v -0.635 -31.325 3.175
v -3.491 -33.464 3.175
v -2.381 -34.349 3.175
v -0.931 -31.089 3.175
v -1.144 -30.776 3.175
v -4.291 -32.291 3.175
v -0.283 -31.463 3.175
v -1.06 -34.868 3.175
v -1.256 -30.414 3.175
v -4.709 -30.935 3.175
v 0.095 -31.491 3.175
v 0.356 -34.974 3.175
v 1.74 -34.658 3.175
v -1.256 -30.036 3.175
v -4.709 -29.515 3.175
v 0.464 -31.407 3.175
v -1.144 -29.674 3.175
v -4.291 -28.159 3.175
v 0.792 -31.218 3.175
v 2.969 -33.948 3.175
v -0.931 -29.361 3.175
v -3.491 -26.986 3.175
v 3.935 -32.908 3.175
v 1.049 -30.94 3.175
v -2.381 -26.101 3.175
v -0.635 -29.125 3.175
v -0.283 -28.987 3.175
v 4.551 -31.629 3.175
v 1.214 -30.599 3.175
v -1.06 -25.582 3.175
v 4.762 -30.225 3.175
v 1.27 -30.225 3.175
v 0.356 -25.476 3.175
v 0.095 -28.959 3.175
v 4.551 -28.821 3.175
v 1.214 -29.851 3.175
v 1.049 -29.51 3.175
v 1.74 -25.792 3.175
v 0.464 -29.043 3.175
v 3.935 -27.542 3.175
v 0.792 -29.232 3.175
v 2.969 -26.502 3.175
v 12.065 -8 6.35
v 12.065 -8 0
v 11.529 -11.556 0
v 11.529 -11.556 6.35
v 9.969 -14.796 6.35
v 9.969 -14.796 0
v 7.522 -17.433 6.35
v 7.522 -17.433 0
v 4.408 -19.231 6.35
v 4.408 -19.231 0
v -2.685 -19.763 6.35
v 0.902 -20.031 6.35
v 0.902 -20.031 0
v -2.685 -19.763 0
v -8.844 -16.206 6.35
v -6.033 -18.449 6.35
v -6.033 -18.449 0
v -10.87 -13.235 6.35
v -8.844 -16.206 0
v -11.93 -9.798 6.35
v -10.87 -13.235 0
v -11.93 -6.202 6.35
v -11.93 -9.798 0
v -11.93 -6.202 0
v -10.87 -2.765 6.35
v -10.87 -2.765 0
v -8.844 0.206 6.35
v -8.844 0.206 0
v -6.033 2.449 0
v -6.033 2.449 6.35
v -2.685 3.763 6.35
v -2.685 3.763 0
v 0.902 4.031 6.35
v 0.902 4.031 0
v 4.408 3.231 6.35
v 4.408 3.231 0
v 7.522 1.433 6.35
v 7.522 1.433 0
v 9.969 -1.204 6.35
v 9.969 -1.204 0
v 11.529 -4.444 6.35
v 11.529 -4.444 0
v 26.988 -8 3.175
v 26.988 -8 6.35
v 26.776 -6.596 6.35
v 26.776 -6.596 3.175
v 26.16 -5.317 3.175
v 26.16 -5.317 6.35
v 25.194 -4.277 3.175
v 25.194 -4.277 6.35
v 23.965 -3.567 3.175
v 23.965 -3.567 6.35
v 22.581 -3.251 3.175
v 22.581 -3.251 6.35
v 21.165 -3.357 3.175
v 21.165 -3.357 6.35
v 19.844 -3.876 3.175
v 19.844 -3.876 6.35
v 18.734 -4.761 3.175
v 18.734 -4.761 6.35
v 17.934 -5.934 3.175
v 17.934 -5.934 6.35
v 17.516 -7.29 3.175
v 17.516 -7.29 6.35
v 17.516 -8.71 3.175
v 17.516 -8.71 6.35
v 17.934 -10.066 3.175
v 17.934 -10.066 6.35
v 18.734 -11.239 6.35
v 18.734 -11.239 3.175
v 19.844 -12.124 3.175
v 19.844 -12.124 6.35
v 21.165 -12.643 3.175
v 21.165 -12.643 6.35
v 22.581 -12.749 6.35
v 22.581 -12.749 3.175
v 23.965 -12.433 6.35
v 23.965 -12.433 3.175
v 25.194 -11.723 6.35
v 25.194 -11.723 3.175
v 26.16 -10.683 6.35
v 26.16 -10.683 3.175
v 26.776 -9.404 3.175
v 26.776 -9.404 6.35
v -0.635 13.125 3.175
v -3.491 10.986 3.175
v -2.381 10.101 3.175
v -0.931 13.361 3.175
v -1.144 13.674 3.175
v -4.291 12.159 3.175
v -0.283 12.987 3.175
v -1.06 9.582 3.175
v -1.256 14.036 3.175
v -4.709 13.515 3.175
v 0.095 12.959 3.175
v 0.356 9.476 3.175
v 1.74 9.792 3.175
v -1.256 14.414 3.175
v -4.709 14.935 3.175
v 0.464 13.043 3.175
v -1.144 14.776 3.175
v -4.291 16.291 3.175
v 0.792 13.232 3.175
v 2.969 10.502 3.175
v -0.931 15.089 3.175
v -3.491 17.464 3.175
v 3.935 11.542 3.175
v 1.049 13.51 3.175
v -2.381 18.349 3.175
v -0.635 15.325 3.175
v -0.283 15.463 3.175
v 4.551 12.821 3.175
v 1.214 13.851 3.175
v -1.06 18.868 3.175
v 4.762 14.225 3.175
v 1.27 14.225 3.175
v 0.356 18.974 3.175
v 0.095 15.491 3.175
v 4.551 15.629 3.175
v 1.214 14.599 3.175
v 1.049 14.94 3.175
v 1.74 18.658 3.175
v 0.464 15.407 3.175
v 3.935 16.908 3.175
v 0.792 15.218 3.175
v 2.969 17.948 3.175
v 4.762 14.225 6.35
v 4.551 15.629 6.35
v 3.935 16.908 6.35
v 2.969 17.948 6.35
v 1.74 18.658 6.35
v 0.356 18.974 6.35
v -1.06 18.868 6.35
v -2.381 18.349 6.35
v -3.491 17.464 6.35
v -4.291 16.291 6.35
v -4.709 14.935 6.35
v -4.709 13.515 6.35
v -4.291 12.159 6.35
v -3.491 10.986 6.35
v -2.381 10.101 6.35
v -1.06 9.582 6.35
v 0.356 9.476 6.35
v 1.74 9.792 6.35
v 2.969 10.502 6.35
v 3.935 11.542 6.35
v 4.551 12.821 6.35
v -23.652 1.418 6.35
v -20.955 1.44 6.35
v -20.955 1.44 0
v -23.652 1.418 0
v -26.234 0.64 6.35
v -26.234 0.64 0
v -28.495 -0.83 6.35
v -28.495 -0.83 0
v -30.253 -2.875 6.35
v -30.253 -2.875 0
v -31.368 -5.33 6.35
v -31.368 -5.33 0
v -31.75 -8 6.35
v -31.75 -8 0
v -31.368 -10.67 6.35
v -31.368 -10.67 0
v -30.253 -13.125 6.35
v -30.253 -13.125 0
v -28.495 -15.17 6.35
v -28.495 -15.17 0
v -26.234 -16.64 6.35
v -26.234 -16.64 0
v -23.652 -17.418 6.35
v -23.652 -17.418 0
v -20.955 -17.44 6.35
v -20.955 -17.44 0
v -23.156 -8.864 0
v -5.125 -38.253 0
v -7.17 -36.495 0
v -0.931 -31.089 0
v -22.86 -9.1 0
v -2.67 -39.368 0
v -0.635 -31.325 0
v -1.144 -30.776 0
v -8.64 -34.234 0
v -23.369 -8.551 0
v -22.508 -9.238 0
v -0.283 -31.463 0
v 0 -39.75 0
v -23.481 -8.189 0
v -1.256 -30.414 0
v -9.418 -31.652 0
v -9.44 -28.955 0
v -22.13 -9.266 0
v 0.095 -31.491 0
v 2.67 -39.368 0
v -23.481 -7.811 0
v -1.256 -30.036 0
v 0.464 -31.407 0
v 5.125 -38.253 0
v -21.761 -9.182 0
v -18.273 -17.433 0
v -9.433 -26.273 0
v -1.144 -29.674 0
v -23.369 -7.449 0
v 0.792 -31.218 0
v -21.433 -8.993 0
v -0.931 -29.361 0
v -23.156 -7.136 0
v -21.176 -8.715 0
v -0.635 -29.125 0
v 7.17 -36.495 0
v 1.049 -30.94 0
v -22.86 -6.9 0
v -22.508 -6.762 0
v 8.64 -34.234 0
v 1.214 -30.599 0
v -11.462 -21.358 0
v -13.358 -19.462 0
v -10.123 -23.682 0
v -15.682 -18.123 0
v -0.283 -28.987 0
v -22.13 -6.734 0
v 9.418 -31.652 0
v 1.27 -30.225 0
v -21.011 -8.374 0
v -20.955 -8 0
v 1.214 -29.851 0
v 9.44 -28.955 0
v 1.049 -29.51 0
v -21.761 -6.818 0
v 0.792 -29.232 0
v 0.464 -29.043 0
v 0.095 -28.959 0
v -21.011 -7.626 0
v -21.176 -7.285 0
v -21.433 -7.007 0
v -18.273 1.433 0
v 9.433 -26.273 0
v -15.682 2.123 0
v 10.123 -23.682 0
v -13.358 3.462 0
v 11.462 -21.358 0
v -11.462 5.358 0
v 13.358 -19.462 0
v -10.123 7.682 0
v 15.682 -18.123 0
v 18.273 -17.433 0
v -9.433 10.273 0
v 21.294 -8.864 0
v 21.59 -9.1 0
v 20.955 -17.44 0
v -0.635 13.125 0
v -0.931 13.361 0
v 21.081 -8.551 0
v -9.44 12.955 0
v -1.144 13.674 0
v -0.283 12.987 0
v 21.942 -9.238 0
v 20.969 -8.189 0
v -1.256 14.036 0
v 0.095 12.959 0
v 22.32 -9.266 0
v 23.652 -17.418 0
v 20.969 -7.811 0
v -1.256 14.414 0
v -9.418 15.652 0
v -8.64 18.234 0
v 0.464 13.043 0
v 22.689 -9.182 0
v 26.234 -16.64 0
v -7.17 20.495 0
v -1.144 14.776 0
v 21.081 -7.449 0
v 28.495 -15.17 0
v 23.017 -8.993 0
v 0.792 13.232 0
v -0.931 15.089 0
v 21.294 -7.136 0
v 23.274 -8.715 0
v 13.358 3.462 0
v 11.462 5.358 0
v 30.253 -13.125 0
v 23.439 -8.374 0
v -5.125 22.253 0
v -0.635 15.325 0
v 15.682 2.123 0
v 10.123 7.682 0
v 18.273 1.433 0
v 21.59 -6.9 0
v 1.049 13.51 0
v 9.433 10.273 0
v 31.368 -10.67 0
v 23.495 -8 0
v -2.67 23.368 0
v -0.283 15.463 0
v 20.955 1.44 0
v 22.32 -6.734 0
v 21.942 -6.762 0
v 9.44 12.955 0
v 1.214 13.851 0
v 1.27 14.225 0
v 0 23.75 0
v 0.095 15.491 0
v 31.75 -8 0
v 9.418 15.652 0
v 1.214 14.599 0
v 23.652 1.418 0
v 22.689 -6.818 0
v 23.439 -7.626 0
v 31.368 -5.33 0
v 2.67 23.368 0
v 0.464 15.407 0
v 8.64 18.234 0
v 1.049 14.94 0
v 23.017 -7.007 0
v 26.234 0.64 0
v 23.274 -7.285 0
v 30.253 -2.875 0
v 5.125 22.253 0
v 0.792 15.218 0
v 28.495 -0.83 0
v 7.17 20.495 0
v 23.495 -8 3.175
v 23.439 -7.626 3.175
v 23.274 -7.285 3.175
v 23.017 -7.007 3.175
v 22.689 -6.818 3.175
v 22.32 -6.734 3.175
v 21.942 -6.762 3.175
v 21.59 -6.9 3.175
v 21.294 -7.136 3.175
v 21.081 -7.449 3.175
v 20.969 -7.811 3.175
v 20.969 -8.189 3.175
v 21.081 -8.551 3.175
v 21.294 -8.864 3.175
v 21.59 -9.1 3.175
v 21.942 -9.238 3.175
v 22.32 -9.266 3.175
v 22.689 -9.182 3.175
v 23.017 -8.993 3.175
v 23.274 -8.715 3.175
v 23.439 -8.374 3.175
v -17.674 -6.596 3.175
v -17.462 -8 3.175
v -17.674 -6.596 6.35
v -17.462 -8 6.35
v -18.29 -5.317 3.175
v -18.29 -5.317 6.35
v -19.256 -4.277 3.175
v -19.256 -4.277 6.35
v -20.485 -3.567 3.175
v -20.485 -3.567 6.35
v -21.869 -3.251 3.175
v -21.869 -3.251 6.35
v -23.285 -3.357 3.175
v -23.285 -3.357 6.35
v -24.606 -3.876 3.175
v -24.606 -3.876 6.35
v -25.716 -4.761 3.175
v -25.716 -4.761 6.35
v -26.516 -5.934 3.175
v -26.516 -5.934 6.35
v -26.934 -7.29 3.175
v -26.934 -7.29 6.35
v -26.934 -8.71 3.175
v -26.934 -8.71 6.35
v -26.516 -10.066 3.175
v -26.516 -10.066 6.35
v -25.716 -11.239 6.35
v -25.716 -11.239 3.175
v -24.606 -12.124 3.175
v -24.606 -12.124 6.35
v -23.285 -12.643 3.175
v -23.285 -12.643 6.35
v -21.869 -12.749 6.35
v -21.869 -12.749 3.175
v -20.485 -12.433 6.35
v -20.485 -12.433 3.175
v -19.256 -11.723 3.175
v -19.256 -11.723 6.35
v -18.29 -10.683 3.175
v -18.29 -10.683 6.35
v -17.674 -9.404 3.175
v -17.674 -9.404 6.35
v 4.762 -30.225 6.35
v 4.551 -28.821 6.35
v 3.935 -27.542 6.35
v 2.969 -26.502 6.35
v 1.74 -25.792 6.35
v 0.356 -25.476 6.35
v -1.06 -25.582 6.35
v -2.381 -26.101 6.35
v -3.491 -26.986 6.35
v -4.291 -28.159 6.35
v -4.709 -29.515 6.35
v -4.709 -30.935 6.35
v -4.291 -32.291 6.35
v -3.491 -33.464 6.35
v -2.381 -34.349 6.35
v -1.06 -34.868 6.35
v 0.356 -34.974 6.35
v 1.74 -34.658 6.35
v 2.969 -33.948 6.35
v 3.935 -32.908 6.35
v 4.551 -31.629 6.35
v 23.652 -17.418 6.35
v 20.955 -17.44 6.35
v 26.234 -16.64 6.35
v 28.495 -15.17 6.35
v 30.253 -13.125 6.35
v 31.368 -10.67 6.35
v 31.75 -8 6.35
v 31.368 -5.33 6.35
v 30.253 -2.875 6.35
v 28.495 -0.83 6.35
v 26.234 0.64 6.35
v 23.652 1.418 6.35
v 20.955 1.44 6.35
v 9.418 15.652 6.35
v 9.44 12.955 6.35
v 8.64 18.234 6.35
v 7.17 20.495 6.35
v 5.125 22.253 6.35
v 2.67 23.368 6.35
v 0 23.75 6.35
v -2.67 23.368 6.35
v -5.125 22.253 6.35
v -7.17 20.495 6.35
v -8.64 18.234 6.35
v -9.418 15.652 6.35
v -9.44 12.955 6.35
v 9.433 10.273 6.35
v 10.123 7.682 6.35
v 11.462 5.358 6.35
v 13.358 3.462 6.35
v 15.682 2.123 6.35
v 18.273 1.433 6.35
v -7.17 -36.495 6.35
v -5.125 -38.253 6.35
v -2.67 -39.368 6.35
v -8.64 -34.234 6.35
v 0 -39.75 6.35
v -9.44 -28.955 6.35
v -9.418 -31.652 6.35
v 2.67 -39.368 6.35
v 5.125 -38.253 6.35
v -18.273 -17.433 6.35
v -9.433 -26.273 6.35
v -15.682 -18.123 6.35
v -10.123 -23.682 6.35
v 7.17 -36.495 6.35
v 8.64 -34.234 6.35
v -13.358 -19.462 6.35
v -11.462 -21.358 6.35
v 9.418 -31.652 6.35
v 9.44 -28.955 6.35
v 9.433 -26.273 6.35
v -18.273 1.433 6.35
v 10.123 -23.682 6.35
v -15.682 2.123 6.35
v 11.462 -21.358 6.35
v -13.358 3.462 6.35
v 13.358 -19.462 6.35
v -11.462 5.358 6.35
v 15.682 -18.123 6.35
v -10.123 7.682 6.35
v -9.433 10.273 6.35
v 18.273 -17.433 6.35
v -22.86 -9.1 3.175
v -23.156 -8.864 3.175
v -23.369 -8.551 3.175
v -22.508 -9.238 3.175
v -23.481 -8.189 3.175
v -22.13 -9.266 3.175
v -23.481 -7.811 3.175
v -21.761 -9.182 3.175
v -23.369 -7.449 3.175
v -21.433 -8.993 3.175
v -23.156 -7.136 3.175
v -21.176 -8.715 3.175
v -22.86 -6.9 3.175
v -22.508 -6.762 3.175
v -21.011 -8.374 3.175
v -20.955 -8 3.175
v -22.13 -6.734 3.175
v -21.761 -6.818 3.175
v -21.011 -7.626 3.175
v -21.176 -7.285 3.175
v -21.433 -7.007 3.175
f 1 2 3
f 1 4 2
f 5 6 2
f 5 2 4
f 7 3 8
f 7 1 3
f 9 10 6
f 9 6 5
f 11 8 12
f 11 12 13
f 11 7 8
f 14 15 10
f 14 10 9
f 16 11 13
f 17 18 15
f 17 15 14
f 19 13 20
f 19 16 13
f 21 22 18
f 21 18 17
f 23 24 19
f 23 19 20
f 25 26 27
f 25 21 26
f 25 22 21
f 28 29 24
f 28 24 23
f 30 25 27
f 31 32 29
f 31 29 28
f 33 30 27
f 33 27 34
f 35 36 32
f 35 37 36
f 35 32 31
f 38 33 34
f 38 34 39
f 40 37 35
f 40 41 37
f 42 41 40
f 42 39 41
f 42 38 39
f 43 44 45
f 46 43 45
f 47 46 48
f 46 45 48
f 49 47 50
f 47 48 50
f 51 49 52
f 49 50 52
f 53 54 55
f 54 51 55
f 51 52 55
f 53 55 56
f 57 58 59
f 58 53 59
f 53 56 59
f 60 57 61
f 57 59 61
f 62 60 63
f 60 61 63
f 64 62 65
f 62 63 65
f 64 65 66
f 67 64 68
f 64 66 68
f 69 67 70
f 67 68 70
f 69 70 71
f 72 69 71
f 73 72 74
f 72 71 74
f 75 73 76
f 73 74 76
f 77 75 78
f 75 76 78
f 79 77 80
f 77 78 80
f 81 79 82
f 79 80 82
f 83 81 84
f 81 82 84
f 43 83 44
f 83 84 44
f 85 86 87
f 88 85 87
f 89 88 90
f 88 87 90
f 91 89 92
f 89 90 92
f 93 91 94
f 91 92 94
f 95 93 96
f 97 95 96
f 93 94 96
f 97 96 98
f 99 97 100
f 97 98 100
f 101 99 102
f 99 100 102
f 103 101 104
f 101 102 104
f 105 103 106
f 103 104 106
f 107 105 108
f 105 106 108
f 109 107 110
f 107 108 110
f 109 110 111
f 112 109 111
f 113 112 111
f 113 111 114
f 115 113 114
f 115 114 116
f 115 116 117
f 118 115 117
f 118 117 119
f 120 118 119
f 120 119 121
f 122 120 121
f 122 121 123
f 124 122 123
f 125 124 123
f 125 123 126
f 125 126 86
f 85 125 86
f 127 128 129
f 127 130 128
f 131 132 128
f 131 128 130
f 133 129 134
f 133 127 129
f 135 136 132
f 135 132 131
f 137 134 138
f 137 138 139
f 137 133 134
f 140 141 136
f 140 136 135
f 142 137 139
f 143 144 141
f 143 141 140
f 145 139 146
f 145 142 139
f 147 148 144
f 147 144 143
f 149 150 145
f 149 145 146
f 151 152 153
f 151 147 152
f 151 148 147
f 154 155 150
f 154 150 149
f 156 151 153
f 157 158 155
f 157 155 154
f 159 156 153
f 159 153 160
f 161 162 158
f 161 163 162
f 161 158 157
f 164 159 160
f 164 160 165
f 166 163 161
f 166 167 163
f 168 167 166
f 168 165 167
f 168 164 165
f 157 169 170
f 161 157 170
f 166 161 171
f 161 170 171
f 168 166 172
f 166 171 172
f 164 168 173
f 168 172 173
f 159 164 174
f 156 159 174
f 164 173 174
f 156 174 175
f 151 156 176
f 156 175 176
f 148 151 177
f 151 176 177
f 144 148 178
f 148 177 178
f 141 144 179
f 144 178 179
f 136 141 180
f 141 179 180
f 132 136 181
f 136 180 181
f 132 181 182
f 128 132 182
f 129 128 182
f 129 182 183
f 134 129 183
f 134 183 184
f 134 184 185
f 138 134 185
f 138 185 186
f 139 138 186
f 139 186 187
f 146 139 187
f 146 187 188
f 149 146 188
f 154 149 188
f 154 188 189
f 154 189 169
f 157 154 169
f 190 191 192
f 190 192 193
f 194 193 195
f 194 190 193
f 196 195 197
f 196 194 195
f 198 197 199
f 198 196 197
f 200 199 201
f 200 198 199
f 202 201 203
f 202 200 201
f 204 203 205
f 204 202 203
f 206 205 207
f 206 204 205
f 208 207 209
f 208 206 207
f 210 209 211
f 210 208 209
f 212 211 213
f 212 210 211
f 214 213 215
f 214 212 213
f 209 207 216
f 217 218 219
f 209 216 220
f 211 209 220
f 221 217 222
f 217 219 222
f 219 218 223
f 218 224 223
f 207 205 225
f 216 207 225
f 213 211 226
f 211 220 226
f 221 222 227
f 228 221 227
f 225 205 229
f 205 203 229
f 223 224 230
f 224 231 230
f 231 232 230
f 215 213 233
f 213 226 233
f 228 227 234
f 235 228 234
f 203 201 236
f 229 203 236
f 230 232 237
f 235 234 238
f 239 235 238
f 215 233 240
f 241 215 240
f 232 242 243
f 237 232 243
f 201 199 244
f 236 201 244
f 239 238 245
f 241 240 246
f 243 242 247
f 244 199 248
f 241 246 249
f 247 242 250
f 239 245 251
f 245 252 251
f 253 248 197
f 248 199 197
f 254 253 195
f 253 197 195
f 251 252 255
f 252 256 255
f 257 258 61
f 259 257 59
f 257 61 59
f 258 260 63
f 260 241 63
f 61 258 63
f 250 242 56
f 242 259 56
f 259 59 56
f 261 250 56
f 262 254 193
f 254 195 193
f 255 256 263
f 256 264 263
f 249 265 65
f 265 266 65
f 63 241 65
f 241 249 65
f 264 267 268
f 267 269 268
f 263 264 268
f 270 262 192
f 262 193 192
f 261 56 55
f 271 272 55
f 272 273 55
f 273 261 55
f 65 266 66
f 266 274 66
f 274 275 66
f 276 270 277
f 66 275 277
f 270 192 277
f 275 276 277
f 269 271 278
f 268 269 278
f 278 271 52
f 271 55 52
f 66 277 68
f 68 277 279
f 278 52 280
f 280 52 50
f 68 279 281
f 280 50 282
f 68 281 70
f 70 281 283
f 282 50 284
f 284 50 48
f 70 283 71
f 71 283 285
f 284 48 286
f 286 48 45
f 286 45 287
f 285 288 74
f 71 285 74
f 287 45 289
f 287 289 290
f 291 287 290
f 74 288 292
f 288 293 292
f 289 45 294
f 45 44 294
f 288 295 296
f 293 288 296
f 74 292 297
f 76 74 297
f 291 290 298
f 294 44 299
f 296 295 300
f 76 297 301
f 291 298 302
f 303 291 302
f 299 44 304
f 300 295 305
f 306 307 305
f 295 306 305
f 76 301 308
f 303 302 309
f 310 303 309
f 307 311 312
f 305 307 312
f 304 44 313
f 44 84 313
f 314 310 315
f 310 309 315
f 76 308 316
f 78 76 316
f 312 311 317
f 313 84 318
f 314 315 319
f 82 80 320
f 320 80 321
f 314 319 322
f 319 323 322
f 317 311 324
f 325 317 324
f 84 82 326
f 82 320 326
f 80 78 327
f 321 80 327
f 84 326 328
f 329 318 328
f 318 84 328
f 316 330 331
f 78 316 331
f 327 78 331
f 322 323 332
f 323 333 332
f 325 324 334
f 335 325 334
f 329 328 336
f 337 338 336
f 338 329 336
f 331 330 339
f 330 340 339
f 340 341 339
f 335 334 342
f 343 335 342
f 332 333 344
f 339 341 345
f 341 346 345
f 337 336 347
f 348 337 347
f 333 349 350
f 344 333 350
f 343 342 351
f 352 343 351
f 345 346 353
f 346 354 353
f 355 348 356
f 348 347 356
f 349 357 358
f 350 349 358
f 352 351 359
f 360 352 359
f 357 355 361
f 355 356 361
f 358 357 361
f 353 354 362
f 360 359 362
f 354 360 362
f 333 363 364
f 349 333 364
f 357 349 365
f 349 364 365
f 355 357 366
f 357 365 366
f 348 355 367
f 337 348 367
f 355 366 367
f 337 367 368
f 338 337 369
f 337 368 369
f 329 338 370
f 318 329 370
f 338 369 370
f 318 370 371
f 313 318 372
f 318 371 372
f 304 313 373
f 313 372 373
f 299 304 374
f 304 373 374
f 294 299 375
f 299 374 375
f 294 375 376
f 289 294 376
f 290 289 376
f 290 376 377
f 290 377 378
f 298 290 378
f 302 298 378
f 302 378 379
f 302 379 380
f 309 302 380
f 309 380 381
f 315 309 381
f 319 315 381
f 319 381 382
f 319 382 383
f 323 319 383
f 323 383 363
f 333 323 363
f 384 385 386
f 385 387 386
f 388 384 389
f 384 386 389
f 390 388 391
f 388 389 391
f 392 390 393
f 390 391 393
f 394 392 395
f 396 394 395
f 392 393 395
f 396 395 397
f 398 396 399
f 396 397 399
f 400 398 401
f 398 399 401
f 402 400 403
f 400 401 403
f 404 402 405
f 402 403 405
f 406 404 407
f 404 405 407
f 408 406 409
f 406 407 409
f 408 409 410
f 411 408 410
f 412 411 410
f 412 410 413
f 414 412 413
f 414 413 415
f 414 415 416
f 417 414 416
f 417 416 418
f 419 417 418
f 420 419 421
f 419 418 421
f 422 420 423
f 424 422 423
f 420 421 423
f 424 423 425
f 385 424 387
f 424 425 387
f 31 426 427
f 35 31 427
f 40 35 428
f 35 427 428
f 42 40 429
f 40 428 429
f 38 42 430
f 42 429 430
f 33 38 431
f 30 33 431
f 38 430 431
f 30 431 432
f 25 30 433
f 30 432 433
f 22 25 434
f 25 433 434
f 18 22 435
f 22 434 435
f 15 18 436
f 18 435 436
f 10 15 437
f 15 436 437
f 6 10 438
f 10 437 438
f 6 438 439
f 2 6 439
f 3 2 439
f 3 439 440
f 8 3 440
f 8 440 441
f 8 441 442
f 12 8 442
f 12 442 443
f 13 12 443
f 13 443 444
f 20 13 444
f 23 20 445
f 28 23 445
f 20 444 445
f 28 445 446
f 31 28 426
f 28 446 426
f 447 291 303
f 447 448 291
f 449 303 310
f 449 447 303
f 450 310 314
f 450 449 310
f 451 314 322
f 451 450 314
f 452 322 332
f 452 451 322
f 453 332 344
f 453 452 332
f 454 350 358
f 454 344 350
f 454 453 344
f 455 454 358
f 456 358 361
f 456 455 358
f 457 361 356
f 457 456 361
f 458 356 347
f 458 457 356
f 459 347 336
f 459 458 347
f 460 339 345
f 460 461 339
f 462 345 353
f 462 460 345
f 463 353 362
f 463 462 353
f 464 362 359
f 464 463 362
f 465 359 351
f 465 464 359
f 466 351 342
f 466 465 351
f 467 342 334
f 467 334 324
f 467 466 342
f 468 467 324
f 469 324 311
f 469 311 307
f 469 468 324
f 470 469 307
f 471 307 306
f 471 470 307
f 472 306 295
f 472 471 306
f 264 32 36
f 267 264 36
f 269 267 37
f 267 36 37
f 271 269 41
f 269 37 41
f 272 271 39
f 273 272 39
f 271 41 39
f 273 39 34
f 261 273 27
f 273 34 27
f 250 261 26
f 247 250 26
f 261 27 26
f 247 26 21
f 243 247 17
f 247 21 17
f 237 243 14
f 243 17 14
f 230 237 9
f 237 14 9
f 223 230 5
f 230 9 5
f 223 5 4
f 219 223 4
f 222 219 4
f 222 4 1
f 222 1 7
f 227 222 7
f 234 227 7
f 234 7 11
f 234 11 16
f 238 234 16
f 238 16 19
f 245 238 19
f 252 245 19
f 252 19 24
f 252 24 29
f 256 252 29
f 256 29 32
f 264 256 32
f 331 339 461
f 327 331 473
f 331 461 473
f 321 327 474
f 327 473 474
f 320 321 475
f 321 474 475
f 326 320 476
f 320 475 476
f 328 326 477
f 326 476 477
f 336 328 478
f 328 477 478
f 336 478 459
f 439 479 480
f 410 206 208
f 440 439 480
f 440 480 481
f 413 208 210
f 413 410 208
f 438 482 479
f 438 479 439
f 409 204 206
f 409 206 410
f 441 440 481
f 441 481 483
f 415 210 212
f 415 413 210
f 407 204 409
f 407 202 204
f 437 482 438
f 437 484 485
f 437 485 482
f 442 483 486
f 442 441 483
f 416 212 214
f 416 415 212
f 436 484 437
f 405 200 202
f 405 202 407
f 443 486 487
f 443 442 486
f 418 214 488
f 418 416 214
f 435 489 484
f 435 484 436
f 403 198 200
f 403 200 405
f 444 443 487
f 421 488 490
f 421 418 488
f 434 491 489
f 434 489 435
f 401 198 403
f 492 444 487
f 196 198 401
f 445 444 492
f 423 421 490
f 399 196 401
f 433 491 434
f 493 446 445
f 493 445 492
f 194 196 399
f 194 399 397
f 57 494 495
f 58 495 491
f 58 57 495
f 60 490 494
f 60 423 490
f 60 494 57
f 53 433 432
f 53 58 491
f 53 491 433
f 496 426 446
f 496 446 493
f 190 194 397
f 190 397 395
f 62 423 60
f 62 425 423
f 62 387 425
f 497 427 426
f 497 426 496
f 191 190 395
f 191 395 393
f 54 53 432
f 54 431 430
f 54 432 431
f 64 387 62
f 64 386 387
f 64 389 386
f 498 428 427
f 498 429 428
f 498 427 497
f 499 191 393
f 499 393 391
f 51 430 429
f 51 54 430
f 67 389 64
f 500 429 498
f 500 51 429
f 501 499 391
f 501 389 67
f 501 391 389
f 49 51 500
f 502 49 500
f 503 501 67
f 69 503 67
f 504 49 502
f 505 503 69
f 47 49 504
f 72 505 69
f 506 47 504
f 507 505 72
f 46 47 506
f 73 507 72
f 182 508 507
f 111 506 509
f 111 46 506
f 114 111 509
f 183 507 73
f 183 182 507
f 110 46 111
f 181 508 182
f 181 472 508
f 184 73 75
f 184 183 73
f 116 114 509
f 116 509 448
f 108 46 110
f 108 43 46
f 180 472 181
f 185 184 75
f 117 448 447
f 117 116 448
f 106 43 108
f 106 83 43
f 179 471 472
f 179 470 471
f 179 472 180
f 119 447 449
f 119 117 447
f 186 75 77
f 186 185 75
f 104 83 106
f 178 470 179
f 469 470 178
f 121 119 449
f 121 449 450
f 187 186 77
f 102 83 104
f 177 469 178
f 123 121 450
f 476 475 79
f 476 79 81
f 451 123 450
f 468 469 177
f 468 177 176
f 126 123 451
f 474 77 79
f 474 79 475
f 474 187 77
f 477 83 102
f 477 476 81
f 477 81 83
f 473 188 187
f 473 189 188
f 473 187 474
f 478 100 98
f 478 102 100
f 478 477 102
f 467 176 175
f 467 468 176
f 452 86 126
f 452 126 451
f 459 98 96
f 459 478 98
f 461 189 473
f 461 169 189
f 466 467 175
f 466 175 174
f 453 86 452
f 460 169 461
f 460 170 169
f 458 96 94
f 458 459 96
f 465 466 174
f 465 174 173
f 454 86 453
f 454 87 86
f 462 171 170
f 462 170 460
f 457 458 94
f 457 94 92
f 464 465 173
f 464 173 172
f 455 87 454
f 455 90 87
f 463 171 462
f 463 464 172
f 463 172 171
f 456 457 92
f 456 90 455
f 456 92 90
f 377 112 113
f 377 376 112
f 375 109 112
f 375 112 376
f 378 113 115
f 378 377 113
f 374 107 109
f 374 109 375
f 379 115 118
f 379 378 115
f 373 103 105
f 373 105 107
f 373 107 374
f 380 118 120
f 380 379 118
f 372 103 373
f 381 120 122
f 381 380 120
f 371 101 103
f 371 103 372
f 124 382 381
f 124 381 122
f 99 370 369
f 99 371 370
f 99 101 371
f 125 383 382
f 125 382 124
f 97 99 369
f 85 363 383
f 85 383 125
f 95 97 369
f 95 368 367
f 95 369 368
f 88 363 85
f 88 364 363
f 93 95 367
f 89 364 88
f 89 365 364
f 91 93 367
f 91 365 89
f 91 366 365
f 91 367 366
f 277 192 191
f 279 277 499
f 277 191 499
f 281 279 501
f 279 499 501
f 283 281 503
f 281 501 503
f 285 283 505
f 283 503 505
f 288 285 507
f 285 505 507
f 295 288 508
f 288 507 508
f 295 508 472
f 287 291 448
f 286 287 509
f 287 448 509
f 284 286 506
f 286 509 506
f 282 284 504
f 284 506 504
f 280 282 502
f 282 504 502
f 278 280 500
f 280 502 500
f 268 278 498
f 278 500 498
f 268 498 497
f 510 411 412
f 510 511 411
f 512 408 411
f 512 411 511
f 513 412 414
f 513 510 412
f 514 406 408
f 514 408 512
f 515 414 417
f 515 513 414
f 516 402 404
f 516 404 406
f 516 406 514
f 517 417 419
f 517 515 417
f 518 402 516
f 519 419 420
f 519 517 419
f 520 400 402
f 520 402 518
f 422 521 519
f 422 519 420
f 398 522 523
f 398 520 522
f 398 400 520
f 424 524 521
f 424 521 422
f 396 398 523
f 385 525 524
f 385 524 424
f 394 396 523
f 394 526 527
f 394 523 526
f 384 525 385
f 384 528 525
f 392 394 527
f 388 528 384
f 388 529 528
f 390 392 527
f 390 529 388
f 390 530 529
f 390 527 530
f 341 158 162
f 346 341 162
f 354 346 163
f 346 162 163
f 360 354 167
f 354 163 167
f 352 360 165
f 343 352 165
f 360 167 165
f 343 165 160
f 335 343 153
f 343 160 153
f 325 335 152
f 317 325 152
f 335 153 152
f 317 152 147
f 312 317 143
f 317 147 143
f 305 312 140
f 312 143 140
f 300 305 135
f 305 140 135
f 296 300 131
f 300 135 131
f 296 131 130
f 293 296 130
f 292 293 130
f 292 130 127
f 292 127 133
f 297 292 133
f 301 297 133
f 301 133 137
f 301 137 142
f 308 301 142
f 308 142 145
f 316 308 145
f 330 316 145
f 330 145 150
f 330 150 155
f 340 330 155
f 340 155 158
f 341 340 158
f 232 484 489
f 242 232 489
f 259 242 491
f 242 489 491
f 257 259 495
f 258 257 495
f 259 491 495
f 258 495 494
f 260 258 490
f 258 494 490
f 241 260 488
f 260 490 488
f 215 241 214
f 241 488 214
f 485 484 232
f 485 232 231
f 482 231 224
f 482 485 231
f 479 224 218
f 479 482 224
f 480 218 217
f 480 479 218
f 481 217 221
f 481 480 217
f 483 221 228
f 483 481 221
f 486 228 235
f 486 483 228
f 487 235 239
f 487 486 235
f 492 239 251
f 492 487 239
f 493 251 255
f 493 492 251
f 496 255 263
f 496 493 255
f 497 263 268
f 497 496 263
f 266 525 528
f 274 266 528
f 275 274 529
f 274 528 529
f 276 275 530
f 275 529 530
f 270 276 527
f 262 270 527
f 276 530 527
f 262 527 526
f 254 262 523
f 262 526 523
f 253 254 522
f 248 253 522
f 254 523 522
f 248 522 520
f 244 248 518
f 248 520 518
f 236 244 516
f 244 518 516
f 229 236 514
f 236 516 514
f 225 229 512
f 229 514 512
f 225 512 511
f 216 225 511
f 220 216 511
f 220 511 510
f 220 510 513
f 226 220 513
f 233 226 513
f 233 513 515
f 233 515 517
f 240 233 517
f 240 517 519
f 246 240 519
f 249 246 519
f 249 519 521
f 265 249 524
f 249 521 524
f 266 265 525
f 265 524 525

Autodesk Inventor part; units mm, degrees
ref_plane "YZ Plane" through (0, 0, 0) normal (1, 0, 0) x (0, 1, 0)
ref_plane "XZ Plane" through (0, 0, 0) normal (0, 1, 0) x (-1, 0, 0)
sketch "Sketch1" plane through (0, 0, 0) normal (0, 0, 1) x (1, 0, 0)
  circle A0 centre (0, -8) radius 12.065 projected
  arc A1 (-7.912, -62.1223) -> (-4.7827, -62.4881) centre (0, -8) ccw projected
  arc A2 (-3.3911, -60.1215) -> (-4.7827, -62.4881) centre (5.3956, -66.8807) ccw projected
  arc A3 (3.3911, -60.1215) -> (-3.3911, -60.1215) centre (0, -62.6976) ccw projected
  arc A4 (4.7827, -62.4881) -> (3.3911, -60.1215) centre (-5.3956, -66.8807) ccw projected
  arc A5 (4.7827, -62.4881) -> (7.912, -62.1223) centre (0, -8) ccw projected
  arc A6 (8.7203, -59.4986) -> (7.912, -62.1223) centre (18.829, -64.0493) ccw projected
  arc A7 (15.3198, -57.9345) -> (8.7203, -59.4986) centre (12.6141, -61.2232) ccw projected
  arc A8 (17.2196, -59.9164) -> (15.3198, -57.9345) centre (8.3287, -66.5379) ccw projected
  arc A9 (17.2196, -59.9164) -> (20.1802, -58.8388) centre (0, -8) ccw projected
  arc A10 (20.3617, -56.0994) -> (20.1802, -58.8388) centre (31.2473, -58.1962) ccw projected
  arc A11 (26.4225, -53.0555) -> (20.3617, -56.0994) centre (24.5482, -56.8795) ccw projected
  arc A12 (28.7282, -54.5458) -> (26.4225, -53.0555) centre (21.6039, -63.0393) ccw projected
  arc A13 (28.7282, -54.5458) -> (31.3605, -52.8146) centre (0, -8) ccw projected
  arc A14 (30.9053, -50.1072) -> (31.3605, -52.8146) centre (41.9811, -49.637) ccw projected
  arc A15 (36.1008, -45.7476) -> (30.9053, -50.1072) centre (35.1589, -49.9008) ccw projected
  arc A16 (38.688, -46.666) -> (36.1008, -45.7476) centre (33.7145, -56.5735) ccw projected
  arc A17 (38.688, -46.666) -> (40.8501, -44.3744) centre (0, -8) ccw projected
  arc A18 (39.7828, -41.8449) -> (40.8501, -44.3744) centre (50.4517, -38.8332) ccw projected
  arc A19 (43.8329, -36.4047) -> (39.7828, -41.8449) centre (43.8742, -40.6631) ccw projected
  arc A20 (46.5622, -36.7017) -> (43.8329, -36.4047) centre (44.0076, -47.4891) ccw projected
  arc A21 (46.5622, -36.7017) -> (48.1375, -33.9732) centre (0, -8) ccw projected
  arc A22 (46.5156, -31.7581) -> (48.1375, -33.9732) centre (56.2023, -26.3671) ccw projected
  arc A23 (49.2019, -25.5305) -> (46.5156, -31.7581) centre (50.2242, -29.6646) ccw projected
  arc A24 (51.9262, -25.19) -> (49.2019, -25.5305) centre (51.9282, -36.2758) ccw projected
  arc A25 (51.9262, -25.19) -> (52.8298, -22.1718) centre (0, -8) ccw projected
  arc A26 (50.7408, -20.3904) -> (52.8298, -22.1718) centre (58.9232, -12.9109) ccw projected
  arc A27 (51.9185, -13.7112) -> (50.7408, -20.3904) centre (53.8666, -17.4981) ccw projected
  arc A28 (54.4908, -12.7517) -> (51.9185, -13.7112) centre (57.0493, -23.5382) ccw projected
  arc A29 (54.4908, -12.7517) -> (54.674, -9.6064) centre (0, -8) ccw projected
  arc A30 (52.2305, -8.3548) -> (54.674, -9.6064) centre (58.4674, 0.8101) ccw projected
  arc A31 (51.8361, -1.584) -> (52.2305, -8.3548) centre (54.605, -4.8196) ccw projected
  arc A32 (54.1178, -0.0572) -> (51.8361, -1.584) centre (59.0949, -9.9629) ccw projected
  arc A33 (54.1178, -0.0572) -> (53.5707, 3.0455) centre (0, -8) ccw projected
  arc A34 (50.9044, 3.6999) -> (53.5707, 3.0455) centre (54.8597, 14.0561) ccw projected
  arc A35 (48.9593, 10.1973) -> (50.9044, 3.6999) centre (52.3997, 7.6874) ccw projected
  arc A36 (50.8273, 12.2092) -> (48.9593, 10.1973) centre (57.9546, 3.7182) ccw projected
  arc A37 (50.8273, 12.2092) -> (49.5794, 15.1021) centre (0, -8) ccw projected
  arc A38 (46.8341, 15.1239) -> (49.5794, 15.1021) centre (48.2944, 26.1131) ccw projected
  arc A39 (43.443, 20.9975) -> (46.8341, 15.1239) centre (47.3695, 19.3488) ccw projected
  arc A40 (44.7967, 23.386) -> (43.443, 20.9975) centre (53.69, 16.7676) ccw projected
  arc A41 (44.7967, 23.386) -> (42.9153, 25.9131) centre (0, -8) ccw projected
  arc A42 (40.2389, 25.3013) -> (42.9153, 25.9131) centre (39.1256, 36.331) ccw projected
  arc A43 (35.5847, 30.2346) -> (40.2389, 25.3013) centre (39.7856, 29.5357) ccw projected
  arc A44 (36.3511, 32.8708) -> (35.5847, 30.2346) centre (46.531, 28.4818) ccw projected
  arc A45 (36.3511, 32.8708) -> (33.9376, 34.896) centre (0, -8) ccw projected
  arc A46 (31.4745, 33.6834) -> (33.9376, 34.896) centre (27.8475, 44.1591) ccw projected
  arc A47 (25.808, 37.4103) -> (31.4745, 33.6834) centre (30.0568, 37.6992) ccw projected
  arc A48 (25.9458, 40.1523) -> (25.808, 37.4103) centre (36.8635, 38.2292) ccw projected
  arc A49 (25.9458, 40.1523) -> (23.1303, 41.5662) centre (0, -8) ccw projected
  arc A50 (21.0132, 39.8183) -> (23.1303, 41.5662) centre (15.0682, 49.1752) ccw projected
  arc A51 (14.64, 42.138) -> (21.0132, 39.8183) centre (18.7077, 43.3989) ccw projected
  arc A52 (14.1417, 44.8378) -> (14.64, 42.138) centre (25.2086, 45.4844) ccw projected
  arc A53 (14.1417, 44.8378) -> (11.0761, 45.5644) centre (0, -8) ccw projected
  arc A54 (9.4191, 43.3754) -> (11.0761, 45.5644) centre (1.4765, 51.109) ccw projected
  arc A55 (2.6827, 44.1627) -> (9.4191, 43.3754) centre (6.35, 46.3277) ccw projected
  arc A56 (1.5753, 46.6749) -> (2.6827, 44.1627) centre (12.1948, 49.8562) ccw projected
  arc A57 (1.5753, 46.6749) -> (-1.5753, 46.6749) centre (0, -8) ccw projected
  arc A58 (-2.6827, 44.1627) -> (-1.5753, 46.6749) centre (-12.1948, 49.8562) ccw projected
  arc A59 (-9.4191, 43.3754) -> (-2.6827, 44.1627) centre (-6.35, 46.3277) ccw projected
  arc A60 (-11.0761, 45.5644) -> (-9.4191, 43.3754) centre (-1.4765, 51.109) ccw projected
  arc A61 (-11.0761, 45.5644) -> (-14.1417, 44.8378) centre (0, -8) ccw projected
  arc A62 (-14.64, 42.138) -> (-14.1417, 44.8378) centre (-25.2086, 45.4844) ccw projected
  arc A63 (-21.0132, 39.8183) -> (-14.64, 42.138) centre (-18.7077, 43.3989) ccw projected
  arc A64 (-23.1303, 41.5662) -> (-21.0132, 39.8183) centre (-15.0682, 49.1752) ccw projected
  arc A65 (-23.1303, 41.5662) -> (-25.9458, 40.1523) centre (0, -8) ccw projected
  arc A66 (-25.808, 37.4103) -> (-25.9458, 40.1523) centre (-36.8635, 38.2292) ccw projected
  arc A67 (-31.4745, 33.6834) -> (-25.808, 37.4103) centre (-30.0568, 37.6992) ccw projected
  arc A68 (-33.9376, 34.896) -> (-31.4745, 33.6834) centre (-27.8475, 44.1591) ccw projected
  arc A69 (-33.9376, 34.896) -> (-36.3511, 32.8708) centre (0, -8) ccw projected
  arc A70 (-35.5847, 30.2346) -> (-36.3511, 32.8708) centre (-46.531, 28.4818) ccw projected
  arc A71 (-40.2389, 25.3013) -> (-35.5847, 30.2346) centre (-39.7856, 29.5357) ccw projected
  arc A72 (-42.9153, 25.9131) -> (-40.2389, 25.3013) centre (-39.1256, 36.331) ccw projected
  arc A73 (-42.9153, 25.9131) -> (-44.7967, 23.386) centre (0, -8) ccw projected
  arc A74 (-43.443, 20.9975) -> (-44.7967, 23.386) centre (-53.69, 16.7676) ccw projected
  arc A75 (-46.8341, 15.1239) -> (-43.443, 20.9975) centre (-47.3695, 19.3488) ccw projected
  arc A76 (-49.5794, 15.1021) -> (-46.8341, 15.1239) centre (-48.2944, 26.1131) ccw projected
  arc A77 (-49.5794, 15.1021) -> (-50.8273, 12.2092) centre (0, -8) ccw projected
  arc A78 (-48.9593, 10.1973) -> (-50.8273, 12.2092) centre (-57.9546, 3.7182) ccw projected
  arc A79 (-50.9044, 3.6999) -> (-48.9593, 10.1973) centre (-52.3997, 7.6874) ccw projected
  arc A80 (-53.5707, 3.0455) -> (-50.9044, 3.6999) centre (-54.8597, 14.0561) ccw projected
  arc A81 (-53.5707, 3.0455) -> (-54.1178, -0.0572) centre (0, -8) ccw projected
  arc A82 (-51.8361, -1.584) -> (-54.1178, -0.0572) centre (-59.0949, -9.9629) ccw projected
  arc A83 (-52.2305, -8.3548) -> (-51.8361, -1.584) centre (-54.605, -4.8196) ccw projected
  arc A84 (-54.674, -9.6064) -> (-52.2305, -8.3548) centre (-58.4674, 0.8101) ccw projected
  arc A85 (-54.674, -9.6064) -> (-54.4908, -12.7517) centre (0, -8) ccw projected
  arc A86 (-51.9185, -13.7112) -> (-54.4908, -12.7517) centre (-57.0493, -23.5382) ccw projected
  arc A87 (-50.7408, -20.3904) -> (-51.9185, -13.7112) centre (-53.8666, -17.4981) ccw projected
  arc A88 (-52.8298, -22.1718) -> (-50.7408, -20.3904) centre (-58.9232, -12.9109) ccw projected
  arc A89 (-52.8298, -22.1718) -> (-51.9262, -25.19) centre (0, -8) ccw projected
  arc A90 (-49.2019, -25.5305) -> (-51.9262, -25.19) centre (-51.9282, -36.2758) ccw projected
  arc A91 (-46.5156, -31.7581) -> (-49.2019, -25.5305) centre (-50.2242, -29.6646) ccw projected
  arc A92 (-48.1375, -33.9732) -> (-46.5156, -31.7581) centre (-56.2023, -26.3671) ccw projected
  arc A93 (-48.1375, -33.9732) -> (-46.5622, -36.7017) centre (0, -8) ccw projected
  arc A94 (-43.8329, -36.4047) -> (-46.5622, -36.7017) centre (-44.0076, -47.4891) ccw projected
  arc A95 (-39.7828, -41.8449) -> (-43.8329, -36.4047) centre (-43.8742, -40.6631) ccw projected
  arc A96 (-40.8501, -44.3744) -> (-39.7828, -41.8449) centre (-50.4517, -38.8332) ccw projected
  arc A97 (-40.8501, -44.3744) -> (-38.688, -46.666) centre (0, -8) ccw projected
  arc A98 (-36.1008, -45.7476) -> (-38.688, -46.666) centre (-33.7145, -56.5735) ccw projected
  arc A99 (-30.9053, -50.1072) -> (-36.1008, -45.7476) centre (-35.1589, -49.9008) ccw projected
  arc A100 (-31.3605, -52.8146) -> (-30.9053, -50.1072) centre (-41.9811, -49.637) ccw projected
  arc A101 (-31.3605, -52.8146) -> (-28.7282, -54.5458) centre (0, -8) ccw projected
  arc A102 (-26.4225, -53.0555) -> (-28.7282, -54.5458) centre (-21.6039, -63.0393) ccw projected
  arc A103 (-20.3617, -56.0994) -> (-26.4225, -53.0555) centre (-24.5482, -56.8795) ccw projected
  arc A104 (-20.1802, -58.8388) -> (-20.3617, -56.0994) centre (-31.2473, -58.1962) ccw projected
  arc A105 (-20.1802, -58.8388) -> (-17.2196, -59.9164) centre (0, -8) ccw projected
  arc A106 (-15.3198, -57.9345) -> (-17.2196, -59.9164) centre (-8.3287, -66.5379) ccw projected
  arc A107 (-8.7203, -59.4986) -> (-15.3198, -57.9345) centre (-12.6141, -61.2232) ccw projected
  arc A108 (-7.912, -62.1223) -> (-8.7203, -59.4986) centre (-18.829, -64.0493) ccw projected
  circle A109 centre (0, -8) radius 31.75
  circle A110 centre (-22.225, -8) radius 2.3812 projected
  circle A111 centre (0, 14.225) radius 2.3812 projected
  circle A112 centre (0, -30.225) radius 2.3812 projected
  circle A113 centre (22.225, -8) radius 2.3812 projected
  point P0 (0, 0)
  dimension "d0" = 63.5
extrude "Extrusion1" add sketch "Sketch1" along normal blind 6.35 contours A109 | A110 | A111 | A112 | A113
sketch "Sketch2" plane through (0, -8, 6.35) normal (0, 0, 1) x (1, 0, 0)
  circle A0 centre (0, 0) radius 31.75 projected
  circle A1 centre (0, 0) radius 12.065 projected
  circle A2 centre (22.225, 0) radius 4.7625
  circle A3 centre (0, -22.225) radius 4.7625
  circle A4 centre (-22.225, 0) radius 4.7625
  circle A5 centre (0, 22.225) radius 1.27 projected
  circle A6 centre (0, 22.225) radius 4.7625
  circle A7 centre (-22.225, 0) radius 1.27
  circle A8 centre (0, -22.225) radius 1.27
  circle A9 centre (22.225, 0) radius 1.27
  point P0 (0, 8)
  dimension "d3" = 9.525
  dimension "d4" = 9.525
  dimension "d5" = 9.525
  dimension "d6" = 9.525
ref_plane "Work Plane1" through (17.341, -12.884, 3.2549) normal (0, 0, -1) x (0, 1, 0)
extrude "Extrusion2" cut sketch "Sketch2" against normal through all contours A5 | A7 | A8 | A9
extrude "Extrusion3" cut sketch "Sketch2" against normal blind 3.175 contours A2 | A3 | A4 | A6
sketch "Sketch3" plane through (0, -8, 6.35) normal (0, 0, 1) x (1, 0, 0)
  circle A0 centre (22.225, 0) radius 4.7625 projected
  circle A1 centre (0, -22.225) radius 4.7625 projected
  circle A2 centre (-22.225, 0) radius 4.7625 projected
  circle A3 centre (0, 22.225) radius 4.7625 projected
  circle A4 centre (0, 0) radius 12.065 projected
  circle A5 centre (22.225, 0) radius 9.525
  circle A6 centre (0, -22.225) radius 9.525
  circle A7 centre (-22.225, 0) radius 9.525
  circle A8 centre (0, 22.225) radius 9.525
  circle A9 centre (0, 0) radius 17.4625
  circle A10 centre (0, 0) radius 31.75 projected
  arc A11 (20.9547, -9.4399) -> (9.4399, -20.9547) centre (19.5891, -19.5891) ccw
  arc A12 (9.4399, 20.9547) -> (20.9547, 9.4399) centre (19.5891, 19.5891) ccw
  arc A13 (-20.9547, 9.4399) -> (-9.4399, 20.9547) centre (-19.5891, 19.5891) ccw
  arc A14 (-9.4399, -20.9547) -> (-20.9547, -9.4399) centre (-19.5891, -19.5891) ccw
  point P0 (0, 8)
  point P1 (20.9547, 9.4399)
  point P2 (31.75, 0)
  point P3 (0, 31.75)
  point P4 (9.4399, 20.9547)
  point P5 (-9.4399, 20.9547)
  point P6 (-31.75, 0)
  point P7 (-20.9547, 9.4399)
  point P8 (-20.9547, -9.4399)
  point P9 (0, -31.75)
  point P10 (-9.4399, -20.9547)
  dimension "d13" = 360
extrude "Extrusion4" cut sketch "Sketch3" against normal through all contours A12 A8 A10 A5 | A5 A10 A6 A11 | A8 A13 A7 A10 | A10 A7 A14 A6
properties part number "drive sprocket flange socket"
